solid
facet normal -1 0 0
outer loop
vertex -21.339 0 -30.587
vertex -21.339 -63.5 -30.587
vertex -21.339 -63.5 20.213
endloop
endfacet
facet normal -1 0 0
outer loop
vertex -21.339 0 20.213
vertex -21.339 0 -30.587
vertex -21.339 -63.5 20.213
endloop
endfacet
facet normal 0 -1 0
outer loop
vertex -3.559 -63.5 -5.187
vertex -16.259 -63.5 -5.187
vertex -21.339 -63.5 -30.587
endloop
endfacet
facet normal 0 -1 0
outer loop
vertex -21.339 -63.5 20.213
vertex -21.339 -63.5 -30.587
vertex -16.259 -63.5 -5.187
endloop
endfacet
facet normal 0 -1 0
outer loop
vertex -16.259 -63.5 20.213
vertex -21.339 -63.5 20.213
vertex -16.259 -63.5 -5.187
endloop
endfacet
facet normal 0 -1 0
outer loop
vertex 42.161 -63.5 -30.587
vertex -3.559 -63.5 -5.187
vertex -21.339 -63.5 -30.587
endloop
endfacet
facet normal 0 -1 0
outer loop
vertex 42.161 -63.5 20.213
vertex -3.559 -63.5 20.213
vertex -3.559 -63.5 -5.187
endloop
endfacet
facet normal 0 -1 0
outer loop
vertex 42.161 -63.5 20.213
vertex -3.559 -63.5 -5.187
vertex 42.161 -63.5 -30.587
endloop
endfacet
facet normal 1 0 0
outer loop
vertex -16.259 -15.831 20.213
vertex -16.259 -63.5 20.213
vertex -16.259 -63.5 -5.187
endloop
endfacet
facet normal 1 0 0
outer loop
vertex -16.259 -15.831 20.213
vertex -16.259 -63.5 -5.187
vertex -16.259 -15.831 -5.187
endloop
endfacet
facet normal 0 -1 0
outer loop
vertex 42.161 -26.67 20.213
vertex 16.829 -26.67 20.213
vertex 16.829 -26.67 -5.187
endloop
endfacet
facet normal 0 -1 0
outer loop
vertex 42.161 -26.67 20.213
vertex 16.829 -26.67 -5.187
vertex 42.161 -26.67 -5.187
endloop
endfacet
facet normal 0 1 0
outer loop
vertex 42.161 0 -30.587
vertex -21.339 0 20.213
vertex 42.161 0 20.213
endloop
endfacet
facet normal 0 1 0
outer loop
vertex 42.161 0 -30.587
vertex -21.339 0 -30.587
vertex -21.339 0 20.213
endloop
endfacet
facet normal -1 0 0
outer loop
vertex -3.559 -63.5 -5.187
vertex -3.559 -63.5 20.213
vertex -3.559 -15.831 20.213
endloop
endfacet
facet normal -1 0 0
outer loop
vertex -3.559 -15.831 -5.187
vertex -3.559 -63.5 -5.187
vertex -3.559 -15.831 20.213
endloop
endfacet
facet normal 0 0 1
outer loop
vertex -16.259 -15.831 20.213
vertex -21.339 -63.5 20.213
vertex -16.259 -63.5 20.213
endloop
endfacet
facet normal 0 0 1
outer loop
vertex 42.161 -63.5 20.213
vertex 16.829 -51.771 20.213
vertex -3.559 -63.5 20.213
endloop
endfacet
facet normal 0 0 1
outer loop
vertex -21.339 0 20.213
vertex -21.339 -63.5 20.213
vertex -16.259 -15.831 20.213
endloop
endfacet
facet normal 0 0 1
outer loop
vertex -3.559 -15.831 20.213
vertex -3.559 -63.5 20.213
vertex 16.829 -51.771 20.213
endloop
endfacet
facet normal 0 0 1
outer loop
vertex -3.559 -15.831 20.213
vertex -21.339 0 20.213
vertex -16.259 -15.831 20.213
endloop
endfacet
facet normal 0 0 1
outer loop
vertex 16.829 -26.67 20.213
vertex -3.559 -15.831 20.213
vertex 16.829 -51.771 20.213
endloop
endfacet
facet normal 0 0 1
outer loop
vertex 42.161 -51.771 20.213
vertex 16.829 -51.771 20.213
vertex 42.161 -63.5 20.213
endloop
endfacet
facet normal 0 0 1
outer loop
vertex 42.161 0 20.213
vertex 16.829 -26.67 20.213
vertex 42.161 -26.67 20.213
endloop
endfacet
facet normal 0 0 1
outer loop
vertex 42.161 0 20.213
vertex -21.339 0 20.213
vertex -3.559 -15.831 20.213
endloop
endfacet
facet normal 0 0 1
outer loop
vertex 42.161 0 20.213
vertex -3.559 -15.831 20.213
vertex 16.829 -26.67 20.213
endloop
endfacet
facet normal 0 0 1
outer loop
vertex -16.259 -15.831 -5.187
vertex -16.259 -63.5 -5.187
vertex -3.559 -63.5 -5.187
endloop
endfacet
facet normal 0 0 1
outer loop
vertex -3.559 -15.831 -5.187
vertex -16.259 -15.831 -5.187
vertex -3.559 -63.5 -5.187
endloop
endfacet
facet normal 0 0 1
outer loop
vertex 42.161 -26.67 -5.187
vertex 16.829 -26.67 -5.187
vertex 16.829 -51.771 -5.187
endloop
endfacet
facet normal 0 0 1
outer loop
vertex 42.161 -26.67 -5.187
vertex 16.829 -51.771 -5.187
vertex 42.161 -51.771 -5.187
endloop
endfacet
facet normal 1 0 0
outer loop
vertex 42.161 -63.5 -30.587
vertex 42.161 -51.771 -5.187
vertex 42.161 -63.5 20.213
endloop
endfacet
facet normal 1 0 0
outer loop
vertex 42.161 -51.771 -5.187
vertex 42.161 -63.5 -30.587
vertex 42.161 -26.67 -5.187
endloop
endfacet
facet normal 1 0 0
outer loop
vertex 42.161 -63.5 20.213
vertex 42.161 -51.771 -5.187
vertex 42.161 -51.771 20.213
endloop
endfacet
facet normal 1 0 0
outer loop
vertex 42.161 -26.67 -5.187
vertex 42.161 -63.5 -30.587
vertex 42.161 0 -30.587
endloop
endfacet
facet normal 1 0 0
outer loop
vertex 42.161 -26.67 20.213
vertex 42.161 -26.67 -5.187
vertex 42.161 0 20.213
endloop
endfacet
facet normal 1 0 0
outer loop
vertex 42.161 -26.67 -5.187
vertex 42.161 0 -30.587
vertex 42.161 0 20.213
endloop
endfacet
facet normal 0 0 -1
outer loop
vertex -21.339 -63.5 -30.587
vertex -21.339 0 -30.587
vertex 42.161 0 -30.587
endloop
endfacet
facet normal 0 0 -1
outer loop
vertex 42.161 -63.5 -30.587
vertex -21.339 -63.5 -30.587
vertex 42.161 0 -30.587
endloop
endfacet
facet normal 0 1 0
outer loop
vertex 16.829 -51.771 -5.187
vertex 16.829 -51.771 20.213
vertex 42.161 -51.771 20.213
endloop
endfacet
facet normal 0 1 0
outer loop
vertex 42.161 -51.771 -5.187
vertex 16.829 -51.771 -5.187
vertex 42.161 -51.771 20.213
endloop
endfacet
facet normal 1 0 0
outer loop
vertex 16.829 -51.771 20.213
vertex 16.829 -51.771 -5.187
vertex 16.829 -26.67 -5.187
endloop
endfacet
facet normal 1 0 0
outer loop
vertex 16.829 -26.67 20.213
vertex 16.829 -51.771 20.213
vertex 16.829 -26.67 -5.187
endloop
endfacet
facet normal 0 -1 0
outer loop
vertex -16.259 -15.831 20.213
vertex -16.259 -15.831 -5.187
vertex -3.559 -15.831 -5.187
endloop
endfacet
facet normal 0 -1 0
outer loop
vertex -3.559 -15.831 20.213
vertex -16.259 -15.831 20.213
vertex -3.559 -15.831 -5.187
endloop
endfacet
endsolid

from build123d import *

# Parameters (mm, degrees)
F0_W     = 63.5
F0_H     = 50.8
F1_DEPTH = 63.5
F2_W     = 25.3320866376
F2_H     = 25.1011773944
F2_W_2   = 12.7
F2_H_2   = 63.5
F3_DEPTH = 25.4
F4_W     = 12.7
F4_H     = 15.8308558166
F5_DEPTH = 25.4


with BuildPart() as f1:
    # F0 (on Front) → F1 (new body)
    with BuildSketch(Plane.XZ):
        with Locations((10.4112830013, -5.1873601034)):
            Rectangle(F0_W, F0_H)
    extrude(amount=F1_DEPTH)

    # F2 (on face) → F3 (cut)
    with BuildSketch(Plane.XY.offset(20.2126398966)):
        with Locations((29.4952396825, -39.2205901444)):
            Rectangle(F2_W, F2_H)
        with Locations((-9.9087147206, -31.75)):
            Rectangle(F2_W_2, F2_H_2)
    extrude(amount=-F3_DEPTH, mode=Mode.SUBTRACT)

    # F4 (on face) → F5 (join)
    with BuildSketch(Plane.XY.offset(-5.1873601034)):
        with Locations((-9.9087147206, -7.9154279083)):
            Rectangle(F4_W, F4_H)
    extrude(amount=F5_DEPTH)


solid = f1.part
